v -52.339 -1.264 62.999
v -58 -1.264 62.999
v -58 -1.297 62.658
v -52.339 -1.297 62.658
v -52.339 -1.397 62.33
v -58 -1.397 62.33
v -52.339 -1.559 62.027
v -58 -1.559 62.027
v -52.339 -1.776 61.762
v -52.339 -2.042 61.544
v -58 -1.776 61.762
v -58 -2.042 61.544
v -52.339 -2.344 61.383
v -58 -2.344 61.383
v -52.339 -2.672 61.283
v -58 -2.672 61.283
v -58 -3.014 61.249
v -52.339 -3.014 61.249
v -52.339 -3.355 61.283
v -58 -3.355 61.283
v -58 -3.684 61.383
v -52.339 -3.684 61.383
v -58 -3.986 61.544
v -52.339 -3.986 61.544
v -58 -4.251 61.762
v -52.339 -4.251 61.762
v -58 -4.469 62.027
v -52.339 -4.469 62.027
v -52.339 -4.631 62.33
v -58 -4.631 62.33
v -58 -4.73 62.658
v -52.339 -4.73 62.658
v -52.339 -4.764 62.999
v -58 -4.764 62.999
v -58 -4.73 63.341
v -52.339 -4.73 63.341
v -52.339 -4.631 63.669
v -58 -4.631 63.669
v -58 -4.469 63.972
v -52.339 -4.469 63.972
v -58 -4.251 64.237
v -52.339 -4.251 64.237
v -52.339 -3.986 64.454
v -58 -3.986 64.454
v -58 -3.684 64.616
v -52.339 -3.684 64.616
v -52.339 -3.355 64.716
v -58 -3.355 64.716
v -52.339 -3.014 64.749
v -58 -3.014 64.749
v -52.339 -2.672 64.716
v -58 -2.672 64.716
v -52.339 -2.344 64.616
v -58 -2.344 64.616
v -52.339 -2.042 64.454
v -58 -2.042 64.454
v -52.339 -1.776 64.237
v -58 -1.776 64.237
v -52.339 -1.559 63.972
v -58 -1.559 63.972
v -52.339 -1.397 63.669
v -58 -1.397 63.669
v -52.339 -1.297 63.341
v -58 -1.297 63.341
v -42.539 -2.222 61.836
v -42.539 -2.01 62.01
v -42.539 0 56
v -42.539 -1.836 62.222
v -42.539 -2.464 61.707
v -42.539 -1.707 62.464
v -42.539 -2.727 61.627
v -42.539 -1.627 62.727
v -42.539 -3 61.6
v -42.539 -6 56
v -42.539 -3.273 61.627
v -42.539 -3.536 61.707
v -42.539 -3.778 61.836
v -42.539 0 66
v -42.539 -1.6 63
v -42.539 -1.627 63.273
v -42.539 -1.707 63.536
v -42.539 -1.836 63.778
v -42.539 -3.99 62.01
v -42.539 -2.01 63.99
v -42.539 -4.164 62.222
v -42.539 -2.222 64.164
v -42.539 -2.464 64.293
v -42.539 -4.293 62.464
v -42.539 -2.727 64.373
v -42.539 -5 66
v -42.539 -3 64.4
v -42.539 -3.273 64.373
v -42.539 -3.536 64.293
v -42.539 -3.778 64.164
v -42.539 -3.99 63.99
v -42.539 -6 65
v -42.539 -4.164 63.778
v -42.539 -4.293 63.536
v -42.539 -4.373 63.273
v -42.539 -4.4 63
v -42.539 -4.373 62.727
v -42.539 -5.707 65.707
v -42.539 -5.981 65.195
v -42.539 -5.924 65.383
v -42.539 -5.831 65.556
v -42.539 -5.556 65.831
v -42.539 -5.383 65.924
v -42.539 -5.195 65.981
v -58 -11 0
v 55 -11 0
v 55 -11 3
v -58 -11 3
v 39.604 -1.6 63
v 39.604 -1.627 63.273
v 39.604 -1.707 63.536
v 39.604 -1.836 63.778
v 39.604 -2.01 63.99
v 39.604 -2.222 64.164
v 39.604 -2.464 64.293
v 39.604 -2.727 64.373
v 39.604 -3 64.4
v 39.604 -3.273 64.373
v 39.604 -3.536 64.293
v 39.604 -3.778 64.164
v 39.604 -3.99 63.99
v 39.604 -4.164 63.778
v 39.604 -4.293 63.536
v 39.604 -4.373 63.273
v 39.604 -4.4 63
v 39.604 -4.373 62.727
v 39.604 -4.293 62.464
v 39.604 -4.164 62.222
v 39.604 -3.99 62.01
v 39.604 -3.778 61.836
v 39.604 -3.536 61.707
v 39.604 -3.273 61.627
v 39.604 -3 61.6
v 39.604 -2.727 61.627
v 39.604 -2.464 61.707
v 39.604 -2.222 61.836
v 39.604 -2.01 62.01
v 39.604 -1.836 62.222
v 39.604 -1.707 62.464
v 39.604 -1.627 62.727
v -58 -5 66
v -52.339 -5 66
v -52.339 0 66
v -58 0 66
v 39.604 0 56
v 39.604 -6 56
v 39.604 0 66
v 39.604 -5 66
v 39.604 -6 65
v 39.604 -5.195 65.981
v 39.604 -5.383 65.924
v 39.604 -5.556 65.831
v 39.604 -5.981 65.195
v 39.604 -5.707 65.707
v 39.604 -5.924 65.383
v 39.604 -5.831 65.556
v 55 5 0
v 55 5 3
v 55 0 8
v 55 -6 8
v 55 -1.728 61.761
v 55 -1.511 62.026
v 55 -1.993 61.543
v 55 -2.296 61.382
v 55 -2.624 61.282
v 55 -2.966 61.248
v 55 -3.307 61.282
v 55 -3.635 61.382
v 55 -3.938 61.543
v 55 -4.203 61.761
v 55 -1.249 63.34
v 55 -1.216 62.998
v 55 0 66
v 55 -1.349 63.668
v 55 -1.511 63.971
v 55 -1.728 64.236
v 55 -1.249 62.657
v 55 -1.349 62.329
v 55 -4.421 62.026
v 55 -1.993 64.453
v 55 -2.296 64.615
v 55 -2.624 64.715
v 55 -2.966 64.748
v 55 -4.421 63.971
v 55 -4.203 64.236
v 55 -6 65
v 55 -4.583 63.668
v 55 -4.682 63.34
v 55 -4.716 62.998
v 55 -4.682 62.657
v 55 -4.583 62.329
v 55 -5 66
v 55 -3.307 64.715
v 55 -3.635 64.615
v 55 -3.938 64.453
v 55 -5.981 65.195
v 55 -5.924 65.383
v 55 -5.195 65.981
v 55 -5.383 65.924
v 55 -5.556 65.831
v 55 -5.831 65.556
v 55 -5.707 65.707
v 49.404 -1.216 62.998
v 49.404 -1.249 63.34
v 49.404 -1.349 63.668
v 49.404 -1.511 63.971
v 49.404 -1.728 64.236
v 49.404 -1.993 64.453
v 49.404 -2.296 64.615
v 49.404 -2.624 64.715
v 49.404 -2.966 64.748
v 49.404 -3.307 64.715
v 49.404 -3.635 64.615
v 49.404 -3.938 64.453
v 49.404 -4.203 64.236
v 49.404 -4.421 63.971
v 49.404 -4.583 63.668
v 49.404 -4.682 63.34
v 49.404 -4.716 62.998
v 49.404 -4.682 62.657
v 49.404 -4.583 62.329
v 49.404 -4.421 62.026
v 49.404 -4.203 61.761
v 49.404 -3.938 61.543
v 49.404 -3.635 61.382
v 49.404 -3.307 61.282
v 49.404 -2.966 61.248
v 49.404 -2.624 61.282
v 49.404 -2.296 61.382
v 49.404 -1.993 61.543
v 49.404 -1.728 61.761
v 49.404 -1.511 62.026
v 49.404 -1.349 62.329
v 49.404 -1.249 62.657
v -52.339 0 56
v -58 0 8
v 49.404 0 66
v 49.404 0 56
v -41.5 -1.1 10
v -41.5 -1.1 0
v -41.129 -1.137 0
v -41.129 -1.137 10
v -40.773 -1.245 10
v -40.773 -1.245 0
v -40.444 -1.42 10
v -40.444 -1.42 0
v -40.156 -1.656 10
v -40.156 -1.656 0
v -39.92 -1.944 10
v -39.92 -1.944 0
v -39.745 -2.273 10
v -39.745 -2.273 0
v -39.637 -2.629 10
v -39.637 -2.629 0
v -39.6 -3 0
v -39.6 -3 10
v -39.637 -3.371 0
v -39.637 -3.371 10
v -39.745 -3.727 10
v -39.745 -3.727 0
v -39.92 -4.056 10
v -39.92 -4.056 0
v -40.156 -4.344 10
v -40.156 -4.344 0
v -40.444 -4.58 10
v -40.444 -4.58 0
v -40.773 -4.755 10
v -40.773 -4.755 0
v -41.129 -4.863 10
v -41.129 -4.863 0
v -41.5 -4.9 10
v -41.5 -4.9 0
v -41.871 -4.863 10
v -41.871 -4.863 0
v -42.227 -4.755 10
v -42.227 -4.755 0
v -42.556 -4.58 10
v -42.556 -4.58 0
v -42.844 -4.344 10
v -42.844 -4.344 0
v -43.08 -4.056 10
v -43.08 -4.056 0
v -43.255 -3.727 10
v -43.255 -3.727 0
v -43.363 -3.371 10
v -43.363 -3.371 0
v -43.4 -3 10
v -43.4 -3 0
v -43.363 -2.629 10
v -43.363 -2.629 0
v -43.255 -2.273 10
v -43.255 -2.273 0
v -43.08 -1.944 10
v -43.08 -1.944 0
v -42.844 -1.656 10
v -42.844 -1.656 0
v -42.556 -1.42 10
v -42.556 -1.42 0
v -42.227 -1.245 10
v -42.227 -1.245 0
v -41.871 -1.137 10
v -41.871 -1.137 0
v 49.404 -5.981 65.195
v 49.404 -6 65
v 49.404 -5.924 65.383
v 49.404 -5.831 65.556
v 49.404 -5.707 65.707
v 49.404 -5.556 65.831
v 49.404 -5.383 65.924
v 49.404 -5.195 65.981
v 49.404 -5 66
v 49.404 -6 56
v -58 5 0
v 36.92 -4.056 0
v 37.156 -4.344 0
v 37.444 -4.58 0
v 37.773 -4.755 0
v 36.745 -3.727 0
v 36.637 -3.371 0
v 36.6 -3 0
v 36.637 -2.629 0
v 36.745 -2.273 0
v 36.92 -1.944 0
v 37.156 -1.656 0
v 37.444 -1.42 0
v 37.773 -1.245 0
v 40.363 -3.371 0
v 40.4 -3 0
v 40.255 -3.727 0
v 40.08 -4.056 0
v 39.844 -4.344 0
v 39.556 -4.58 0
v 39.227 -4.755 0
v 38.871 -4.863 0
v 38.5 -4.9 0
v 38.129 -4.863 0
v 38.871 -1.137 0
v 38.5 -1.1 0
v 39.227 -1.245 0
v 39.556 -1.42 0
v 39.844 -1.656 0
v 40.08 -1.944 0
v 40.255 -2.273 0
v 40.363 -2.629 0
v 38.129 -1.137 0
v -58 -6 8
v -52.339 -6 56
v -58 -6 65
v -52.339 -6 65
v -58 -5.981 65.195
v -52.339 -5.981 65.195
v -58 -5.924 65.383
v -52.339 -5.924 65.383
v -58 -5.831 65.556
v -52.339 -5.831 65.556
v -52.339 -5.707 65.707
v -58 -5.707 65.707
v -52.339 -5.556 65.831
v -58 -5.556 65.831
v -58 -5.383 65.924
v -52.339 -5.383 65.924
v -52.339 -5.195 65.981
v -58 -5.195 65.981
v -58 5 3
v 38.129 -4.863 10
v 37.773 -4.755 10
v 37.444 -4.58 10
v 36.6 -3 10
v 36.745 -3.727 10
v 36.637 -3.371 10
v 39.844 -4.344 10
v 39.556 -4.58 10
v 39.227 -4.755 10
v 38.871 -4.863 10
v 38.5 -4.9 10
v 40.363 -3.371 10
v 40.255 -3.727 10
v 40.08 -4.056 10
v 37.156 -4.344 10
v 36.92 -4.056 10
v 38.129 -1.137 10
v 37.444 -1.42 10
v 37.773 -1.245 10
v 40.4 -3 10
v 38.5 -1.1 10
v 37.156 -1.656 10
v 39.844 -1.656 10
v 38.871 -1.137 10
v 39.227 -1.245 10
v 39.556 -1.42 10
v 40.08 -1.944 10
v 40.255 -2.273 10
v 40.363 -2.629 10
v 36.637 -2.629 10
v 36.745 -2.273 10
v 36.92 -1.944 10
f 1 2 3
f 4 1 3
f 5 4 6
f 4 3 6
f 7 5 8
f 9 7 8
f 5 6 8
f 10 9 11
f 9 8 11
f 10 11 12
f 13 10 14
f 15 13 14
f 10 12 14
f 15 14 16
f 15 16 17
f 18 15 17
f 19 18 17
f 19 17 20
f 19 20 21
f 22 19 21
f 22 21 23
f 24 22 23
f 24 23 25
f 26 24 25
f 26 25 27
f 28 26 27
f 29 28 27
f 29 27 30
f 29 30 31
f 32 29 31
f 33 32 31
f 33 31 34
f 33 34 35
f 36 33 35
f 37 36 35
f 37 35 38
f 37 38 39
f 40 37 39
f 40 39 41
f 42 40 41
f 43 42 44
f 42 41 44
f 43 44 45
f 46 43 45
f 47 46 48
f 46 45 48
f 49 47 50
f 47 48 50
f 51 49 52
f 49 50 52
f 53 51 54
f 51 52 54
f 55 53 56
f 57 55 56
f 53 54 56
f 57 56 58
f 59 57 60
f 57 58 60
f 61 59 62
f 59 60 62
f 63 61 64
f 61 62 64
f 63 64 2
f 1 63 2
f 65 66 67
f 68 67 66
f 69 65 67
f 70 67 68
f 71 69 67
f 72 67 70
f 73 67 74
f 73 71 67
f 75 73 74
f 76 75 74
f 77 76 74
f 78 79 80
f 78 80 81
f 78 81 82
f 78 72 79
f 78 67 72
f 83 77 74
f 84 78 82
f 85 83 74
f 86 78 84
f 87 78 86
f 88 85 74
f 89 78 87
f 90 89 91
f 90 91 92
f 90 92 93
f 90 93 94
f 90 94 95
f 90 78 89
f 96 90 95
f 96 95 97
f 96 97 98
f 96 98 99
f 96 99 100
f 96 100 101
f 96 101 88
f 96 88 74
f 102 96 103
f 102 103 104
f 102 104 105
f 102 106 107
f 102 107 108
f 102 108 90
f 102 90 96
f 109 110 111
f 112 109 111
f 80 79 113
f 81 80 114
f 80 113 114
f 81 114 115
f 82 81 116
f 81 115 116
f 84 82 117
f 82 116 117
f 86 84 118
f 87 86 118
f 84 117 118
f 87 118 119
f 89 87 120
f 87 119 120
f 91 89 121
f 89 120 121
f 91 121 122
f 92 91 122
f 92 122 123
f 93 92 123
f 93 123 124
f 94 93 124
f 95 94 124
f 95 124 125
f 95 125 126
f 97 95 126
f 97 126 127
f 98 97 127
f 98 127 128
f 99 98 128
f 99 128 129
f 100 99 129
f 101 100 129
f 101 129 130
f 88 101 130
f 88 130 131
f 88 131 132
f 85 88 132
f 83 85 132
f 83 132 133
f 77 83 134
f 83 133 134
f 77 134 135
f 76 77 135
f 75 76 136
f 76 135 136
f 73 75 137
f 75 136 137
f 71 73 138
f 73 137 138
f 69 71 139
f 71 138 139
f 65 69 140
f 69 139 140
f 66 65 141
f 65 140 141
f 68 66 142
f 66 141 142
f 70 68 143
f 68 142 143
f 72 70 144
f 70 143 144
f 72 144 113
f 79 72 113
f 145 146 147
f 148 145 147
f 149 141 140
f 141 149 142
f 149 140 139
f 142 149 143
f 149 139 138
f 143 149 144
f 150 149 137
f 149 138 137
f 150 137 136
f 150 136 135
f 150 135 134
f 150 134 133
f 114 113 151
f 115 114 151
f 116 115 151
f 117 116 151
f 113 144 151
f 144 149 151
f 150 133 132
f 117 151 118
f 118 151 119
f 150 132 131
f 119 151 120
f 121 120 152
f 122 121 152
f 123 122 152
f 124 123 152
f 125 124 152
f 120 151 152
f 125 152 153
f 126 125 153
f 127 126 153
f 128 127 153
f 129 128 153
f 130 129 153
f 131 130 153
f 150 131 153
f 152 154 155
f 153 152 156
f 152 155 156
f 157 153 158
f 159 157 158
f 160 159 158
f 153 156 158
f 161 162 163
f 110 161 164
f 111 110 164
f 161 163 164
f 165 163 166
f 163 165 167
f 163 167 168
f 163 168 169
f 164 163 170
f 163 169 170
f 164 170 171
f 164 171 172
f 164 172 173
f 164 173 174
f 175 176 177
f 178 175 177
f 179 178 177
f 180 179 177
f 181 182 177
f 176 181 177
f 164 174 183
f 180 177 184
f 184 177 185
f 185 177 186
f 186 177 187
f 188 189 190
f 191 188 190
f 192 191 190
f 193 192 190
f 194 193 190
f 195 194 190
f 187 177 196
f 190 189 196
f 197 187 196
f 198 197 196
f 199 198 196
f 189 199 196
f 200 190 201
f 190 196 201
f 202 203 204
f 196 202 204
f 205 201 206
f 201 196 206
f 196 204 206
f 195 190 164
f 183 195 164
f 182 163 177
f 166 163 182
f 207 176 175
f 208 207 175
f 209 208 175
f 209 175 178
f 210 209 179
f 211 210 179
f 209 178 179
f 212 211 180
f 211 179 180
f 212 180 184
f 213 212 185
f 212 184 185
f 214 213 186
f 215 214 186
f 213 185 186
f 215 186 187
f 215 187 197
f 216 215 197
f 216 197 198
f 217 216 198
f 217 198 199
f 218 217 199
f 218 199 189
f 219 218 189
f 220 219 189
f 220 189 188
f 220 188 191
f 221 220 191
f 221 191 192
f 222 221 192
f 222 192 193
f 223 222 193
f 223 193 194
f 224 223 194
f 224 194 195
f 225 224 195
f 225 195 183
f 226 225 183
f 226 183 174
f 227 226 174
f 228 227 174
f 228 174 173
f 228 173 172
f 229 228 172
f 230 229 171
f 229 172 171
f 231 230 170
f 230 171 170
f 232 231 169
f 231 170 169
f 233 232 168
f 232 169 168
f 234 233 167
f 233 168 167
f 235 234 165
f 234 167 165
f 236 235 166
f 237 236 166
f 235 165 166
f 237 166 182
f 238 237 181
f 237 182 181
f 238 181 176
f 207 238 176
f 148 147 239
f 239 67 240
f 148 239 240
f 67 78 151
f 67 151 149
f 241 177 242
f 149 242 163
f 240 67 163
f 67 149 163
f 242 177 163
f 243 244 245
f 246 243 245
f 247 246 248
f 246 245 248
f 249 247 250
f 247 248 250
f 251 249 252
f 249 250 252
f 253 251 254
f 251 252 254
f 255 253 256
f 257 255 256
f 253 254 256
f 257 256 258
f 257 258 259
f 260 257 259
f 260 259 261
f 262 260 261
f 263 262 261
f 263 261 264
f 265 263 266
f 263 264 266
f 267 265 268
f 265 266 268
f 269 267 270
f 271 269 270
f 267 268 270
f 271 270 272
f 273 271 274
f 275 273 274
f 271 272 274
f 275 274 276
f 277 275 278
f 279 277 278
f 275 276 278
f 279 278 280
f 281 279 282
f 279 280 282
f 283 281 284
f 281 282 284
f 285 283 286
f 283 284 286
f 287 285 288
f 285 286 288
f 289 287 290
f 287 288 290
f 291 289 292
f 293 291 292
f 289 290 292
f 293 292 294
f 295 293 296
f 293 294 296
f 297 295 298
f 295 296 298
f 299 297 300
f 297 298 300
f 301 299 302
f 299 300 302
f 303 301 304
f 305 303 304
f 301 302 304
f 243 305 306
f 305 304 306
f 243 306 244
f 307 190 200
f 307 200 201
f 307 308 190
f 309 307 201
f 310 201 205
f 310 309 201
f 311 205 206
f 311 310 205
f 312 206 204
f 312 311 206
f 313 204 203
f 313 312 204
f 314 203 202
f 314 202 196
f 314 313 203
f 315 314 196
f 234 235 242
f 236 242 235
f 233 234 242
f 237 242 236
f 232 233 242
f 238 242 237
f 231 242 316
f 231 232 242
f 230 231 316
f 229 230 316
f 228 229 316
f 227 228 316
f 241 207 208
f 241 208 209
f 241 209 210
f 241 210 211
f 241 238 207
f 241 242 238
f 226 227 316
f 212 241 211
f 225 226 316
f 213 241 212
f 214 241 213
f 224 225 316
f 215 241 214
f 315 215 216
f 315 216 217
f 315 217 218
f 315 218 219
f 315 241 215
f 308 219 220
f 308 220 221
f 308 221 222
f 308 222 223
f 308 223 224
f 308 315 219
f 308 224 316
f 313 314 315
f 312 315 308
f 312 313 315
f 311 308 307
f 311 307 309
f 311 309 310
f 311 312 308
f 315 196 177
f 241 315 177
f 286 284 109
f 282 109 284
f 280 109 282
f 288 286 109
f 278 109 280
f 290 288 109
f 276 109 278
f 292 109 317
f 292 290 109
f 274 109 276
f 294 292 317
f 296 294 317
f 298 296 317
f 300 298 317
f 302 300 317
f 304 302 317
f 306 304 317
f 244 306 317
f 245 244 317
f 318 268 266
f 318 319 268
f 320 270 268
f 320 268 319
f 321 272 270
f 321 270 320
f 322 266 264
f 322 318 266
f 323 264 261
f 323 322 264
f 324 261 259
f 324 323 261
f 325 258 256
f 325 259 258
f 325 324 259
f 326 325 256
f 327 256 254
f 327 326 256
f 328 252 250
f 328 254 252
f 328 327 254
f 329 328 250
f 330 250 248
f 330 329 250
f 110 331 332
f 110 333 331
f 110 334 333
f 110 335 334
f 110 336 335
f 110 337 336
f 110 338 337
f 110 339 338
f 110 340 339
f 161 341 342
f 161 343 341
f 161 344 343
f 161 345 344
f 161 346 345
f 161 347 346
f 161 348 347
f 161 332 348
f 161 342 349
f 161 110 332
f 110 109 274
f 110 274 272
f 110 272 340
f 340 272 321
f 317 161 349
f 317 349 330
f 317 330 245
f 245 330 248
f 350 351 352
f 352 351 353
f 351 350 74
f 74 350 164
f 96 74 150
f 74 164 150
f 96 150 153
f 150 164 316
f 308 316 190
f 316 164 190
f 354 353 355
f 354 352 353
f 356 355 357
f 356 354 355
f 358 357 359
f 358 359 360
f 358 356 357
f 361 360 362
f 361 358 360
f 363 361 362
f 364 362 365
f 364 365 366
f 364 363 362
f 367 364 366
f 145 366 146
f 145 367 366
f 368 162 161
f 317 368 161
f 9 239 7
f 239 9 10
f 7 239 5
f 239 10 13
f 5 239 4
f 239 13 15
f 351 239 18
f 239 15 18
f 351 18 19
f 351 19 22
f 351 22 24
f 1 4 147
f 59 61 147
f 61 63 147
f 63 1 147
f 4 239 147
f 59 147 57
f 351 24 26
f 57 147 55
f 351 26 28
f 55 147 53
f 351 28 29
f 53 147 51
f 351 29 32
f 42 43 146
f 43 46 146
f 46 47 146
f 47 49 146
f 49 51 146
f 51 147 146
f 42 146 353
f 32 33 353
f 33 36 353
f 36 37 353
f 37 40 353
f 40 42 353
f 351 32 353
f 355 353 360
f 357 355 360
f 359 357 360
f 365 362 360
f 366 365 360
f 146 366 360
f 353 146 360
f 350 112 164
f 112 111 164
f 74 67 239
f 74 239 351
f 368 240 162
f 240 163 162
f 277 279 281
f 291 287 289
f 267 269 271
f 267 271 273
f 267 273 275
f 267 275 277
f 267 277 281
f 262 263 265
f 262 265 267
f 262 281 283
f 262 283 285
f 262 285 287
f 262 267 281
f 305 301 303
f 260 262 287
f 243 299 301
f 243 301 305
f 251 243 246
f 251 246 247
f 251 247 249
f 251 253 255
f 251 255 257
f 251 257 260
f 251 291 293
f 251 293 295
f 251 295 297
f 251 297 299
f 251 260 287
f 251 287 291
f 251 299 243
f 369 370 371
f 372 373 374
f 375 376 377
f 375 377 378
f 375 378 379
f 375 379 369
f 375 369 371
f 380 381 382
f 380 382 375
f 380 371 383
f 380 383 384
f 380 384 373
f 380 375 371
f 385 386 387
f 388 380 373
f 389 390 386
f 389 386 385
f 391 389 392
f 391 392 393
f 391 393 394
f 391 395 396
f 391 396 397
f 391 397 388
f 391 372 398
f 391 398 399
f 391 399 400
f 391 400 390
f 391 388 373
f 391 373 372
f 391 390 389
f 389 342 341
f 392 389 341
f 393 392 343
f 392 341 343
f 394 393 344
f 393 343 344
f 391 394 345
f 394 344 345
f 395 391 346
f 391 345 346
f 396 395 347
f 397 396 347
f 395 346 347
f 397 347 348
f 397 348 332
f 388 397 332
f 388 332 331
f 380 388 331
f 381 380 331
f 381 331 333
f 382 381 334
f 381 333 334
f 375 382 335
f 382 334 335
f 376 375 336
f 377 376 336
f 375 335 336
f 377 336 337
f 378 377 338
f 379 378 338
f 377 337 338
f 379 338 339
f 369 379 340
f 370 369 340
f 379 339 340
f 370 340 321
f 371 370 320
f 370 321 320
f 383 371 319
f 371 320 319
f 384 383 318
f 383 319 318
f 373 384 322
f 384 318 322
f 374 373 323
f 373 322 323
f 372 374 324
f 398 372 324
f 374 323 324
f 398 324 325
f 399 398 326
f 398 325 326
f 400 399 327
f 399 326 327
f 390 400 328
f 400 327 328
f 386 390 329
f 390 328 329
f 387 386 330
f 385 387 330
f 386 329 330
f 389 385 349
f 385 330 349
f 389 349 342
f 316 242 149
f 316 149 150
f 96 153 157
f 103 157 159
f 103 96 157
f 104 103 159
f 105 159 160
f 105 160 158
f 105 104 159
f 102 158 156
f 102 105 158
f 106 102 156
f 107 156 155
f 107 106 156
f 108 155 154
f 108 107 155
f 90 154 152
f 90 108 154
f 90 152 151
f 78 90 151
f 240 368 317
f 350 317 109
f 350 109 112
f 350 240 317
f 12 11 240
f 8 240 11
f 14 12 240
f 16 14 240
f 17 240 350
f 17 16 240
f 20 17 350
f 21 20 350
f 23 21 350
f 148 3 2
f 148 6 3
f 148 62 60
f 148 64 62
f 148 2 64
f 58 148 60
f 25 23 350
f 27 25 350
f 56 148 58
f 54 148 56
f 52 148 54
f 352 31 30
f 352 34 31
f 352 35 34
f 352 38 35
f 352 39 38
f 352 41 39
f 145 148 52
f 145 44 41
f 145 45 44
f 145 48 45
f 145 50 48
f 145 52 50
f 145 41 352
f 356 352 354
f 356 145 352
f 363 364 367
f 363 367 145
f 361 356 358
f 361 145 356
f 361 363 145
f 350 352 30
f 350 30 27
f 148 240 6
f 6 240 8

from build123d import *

# Parameters (mm, degrees)
PAD_DEPTH       = 56.5
SKETCH049_W     = 9.963656
SKETCH049_H     = 4.853651
SKETCH049_W_2   = 14.419268
SKETCH049_H_2   = 9.8
SKETCH049_W_3   = 14.165799
SKETCH049_W_4   = 9.249737
SKETCH049_H_3   = 3.2
POCKET033_DEPTH = 10
SKETCH050_R     = 1.4
POCKET034_DEPTH = 113.001
SKETCH051_R     = 1.75
POCKET035_DEPTH = 7
SKETCH052_R     = 1.75
POCKET036_DEPTH = 7
SKETCH053_R     = 1.9
POCKET037_DEPTH = 10
FILLET_R        = 1


with BuildPart() as part:
    # Sketch041 → Pad (new body, symmetric)
    with BuildSketch(Plane.YZ):
        Polygon((-11, 0), (-11, 3), (-6, 8), (-6, 66), (0, 66), (0, 8), (5, 3), (5, 0), (0, 0), align=None)
    extrude(amount=PAD_DEPTH, both=True)

    # Sketch049 (on Face4 of Pad) → Pocket033 (cut)
    with BuildSketch(Plane(origin=(0, 0, 66), x_dir=(0, -1, 0), z_dir=(0, 0, 1))):
        with Locations((1.82395, 59.0693)):
            Rectangle(SKETCH049_W, SKETCH049_H)
        with Locations((2.618054, 46.004022)):
            Rectangle(SKETCH049_W_2, SKETCH049_H_2)
        with Locations((0.916195, -45.939361)):
            Rectangle(SKETCH049_W_3, SKETCH049_H_2)
        with Locations((2.129443, -58.515822)):
            Rectangle(SKETCH049_W_4, SKETCH049_H_3)
    extrude(amount=-POCKET033_DEPTH, mode=Mode.SUBTRACT)

    # Sketch050 (on Face5 of Pocket033) → Pocket034 (cut, through all)
    with BuildSketch(Plane.YZ.offset(56.5)):
        with Locations((-3, 63)):
            Circle(SKETCH050_R)
    extrude(amount=-POCKET034_DEPTH, mode=Mode.SUBTRACT)

    # Sketch051 (on Face5 of Pocket034) → Pocket035 (cut)
    with BuildSketch(Plane.YZ.offset(56.5)):
        with Locations((-2.965743, 62.998383)):
            Circle(SKETCH051_R)
    extrude(amount=-POCKET035_DEPTH, mode=Mode.SUBTRACT)

    # Sketch052 (on Face4 of Pocket035) → Pocket036 (cut)
    with BuildSketch(Plane(origin=(-56.5, 0, 0), x_dir=(0, 1, 0), z_dir=(-1, 0, 0))):
        with Locations((-3.013862, -62.999382)):
            Circle(SKETCH052_R)
    extrude(amount=-POCKET036_DEPTH, mode=Mode.SUBTRACT)

    # Sketch053 (on Face2 of Pocket036) → Pocket037 (cut)
    with BuildSketch(Plane.YX):
        with Locations((-3, 40)):
            Circle(SKETCH053_R)
        with Locations((-3, -40)):
            Circle(SKETCH053_R)
    extrude(amount=-POCKET037_DEPTH, mode=Mode.SUBTRACT)

    # Fillet
    fillet_edges = [part.edges().sort_by_distance(p)[0] for p in [
        (0.03233, -6, 66),
        (53.702011, -6, 66),
        (-53.66968, -6, 66),
    ]]
    fillet(fillet_edges, radius=FILLET_R)


with BuildPart() as part_1:
    # Body placement: moved
    add(part.part.moved(Location((-1.5, 0, 0))))


solid = part_1.part
